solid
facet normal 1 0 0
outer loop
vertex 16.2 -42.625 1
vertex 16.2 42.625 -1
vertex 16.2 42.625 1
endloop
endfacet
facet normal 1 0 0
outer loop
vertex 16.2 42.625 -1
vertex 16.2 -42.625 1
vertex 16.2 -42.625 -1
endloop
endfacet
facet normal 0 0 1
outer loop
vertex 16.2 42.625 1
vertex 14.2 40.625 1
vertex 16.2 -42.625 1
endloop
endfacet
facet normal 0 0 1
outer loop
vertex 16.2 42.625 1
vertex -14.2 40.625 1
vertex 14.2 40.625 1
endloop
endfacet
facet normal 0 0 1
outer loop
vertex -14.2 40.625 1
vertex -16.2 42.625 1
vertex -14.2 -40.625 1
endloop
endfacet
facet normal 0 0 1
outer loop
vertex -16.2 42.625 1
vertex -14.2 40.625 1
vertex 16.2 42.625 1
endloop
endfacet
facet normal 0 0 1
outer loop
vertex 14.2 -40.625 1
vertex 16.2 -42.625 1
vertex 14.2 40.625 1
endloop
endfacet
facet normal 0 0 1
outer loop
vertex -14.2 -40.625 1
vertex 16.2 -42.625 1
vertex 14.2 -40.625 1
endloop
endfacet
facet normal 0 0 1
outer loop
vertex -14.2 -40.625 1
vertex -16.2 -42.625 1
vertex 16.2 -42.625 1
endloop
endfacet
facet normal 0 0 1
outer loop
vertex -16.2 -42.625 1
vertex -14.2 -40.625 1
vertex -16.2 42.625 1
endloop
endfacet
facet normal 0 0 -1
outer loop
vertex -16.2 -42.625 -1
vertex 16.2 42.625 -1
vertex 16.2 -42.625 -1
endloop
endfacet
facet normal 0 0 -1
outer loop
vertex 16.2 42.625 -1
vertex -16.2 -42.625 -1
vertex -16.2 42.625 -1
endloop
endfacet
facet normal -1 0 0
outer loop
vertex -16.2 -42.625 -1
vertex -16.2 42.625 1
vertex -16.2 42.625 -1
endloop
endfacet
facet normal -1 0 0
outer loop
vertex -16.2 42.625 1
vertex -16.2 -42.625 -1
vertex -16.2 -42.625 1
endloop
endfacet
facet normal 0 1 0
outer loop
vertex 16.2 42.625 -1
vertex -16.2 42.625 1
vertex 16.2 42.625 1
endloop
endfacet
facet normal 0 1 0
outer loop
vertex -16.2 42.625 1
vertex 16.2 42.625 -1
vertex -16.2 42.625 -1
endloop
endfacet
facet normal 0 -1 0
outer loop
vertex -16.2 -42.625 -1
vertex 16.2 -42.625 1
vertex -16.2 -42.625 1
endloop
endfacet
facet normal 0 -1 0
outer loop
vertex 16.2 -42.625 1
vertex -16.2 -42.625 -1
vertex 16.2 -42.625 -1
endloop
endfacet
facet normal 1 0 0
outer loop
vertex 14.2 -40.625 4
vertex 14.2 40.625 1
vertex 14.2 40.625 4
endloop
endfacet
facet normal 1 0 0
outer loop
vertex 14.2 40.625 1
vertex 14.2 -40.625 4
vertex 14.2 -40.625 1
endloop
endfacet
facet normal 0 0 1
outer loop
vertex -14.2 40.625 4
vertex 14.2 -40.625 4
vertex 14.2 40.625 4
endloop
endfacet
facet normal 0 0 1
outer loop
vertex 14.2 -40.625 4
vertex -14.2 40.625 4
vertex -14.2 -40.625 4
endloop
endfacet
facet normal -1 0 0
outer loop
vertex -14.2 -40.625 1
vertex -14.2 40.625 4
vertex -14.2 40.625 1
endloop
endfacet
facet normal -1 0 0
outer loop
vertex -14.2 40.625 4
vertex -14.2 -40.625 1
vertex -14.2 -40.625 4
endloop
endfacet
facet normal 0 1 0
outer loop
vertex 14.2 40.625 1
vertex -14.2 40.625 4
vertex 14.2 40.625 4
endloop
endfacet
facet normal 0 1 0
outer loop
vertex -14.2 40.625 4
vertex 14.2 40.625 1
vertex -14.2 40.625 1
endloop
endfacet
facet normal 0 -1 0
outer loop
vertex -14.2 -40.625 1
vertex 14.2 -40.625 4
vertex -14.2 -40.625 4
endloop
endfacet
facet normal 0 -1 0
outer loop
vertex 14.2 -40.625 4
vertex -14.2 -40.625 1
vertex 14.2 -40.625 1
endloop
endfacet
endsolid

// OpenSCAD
/*
nodemcu long/wide 48.5mm
        sort side 25.75mm
        board thickness 1.66

*/

max_board_width = 81.25;
board_thickness = 2;
wall_thickness = 2;
l = max_board_width + (wall_thickness * 2);
//w = 12;
w = 32.4;
h = (board_thickness * 2) + 15 + (wall_thickness * 2);

module case() {


	difference() {
		cube([w, l, h], center=true);
		translate([0, 0, wall_thickness]) cube([w - (wall_thickness * 2), l  - (wall_thickness * 2), h], center=true);
		// 6.75 x 70.5  from top edge 4.75
		color("red") translate([-8, 0, 0]) cube([6.75, 70.5, 28], center=true);
		translate([0, 44, 11]) rotate([90,0,0]) cylinder(r = 4, h = 8, $fn=100);
	}
}

module lid() {
	cube([w, l, 2], center=true);
	translate([-0.5 * w + wall_thickness, -0.50 * l + wall_thickness, 0]) cube([w - (wall_thickness * 2), l - (wall_thickness * 2), 4]);
}

// case();
lid();
